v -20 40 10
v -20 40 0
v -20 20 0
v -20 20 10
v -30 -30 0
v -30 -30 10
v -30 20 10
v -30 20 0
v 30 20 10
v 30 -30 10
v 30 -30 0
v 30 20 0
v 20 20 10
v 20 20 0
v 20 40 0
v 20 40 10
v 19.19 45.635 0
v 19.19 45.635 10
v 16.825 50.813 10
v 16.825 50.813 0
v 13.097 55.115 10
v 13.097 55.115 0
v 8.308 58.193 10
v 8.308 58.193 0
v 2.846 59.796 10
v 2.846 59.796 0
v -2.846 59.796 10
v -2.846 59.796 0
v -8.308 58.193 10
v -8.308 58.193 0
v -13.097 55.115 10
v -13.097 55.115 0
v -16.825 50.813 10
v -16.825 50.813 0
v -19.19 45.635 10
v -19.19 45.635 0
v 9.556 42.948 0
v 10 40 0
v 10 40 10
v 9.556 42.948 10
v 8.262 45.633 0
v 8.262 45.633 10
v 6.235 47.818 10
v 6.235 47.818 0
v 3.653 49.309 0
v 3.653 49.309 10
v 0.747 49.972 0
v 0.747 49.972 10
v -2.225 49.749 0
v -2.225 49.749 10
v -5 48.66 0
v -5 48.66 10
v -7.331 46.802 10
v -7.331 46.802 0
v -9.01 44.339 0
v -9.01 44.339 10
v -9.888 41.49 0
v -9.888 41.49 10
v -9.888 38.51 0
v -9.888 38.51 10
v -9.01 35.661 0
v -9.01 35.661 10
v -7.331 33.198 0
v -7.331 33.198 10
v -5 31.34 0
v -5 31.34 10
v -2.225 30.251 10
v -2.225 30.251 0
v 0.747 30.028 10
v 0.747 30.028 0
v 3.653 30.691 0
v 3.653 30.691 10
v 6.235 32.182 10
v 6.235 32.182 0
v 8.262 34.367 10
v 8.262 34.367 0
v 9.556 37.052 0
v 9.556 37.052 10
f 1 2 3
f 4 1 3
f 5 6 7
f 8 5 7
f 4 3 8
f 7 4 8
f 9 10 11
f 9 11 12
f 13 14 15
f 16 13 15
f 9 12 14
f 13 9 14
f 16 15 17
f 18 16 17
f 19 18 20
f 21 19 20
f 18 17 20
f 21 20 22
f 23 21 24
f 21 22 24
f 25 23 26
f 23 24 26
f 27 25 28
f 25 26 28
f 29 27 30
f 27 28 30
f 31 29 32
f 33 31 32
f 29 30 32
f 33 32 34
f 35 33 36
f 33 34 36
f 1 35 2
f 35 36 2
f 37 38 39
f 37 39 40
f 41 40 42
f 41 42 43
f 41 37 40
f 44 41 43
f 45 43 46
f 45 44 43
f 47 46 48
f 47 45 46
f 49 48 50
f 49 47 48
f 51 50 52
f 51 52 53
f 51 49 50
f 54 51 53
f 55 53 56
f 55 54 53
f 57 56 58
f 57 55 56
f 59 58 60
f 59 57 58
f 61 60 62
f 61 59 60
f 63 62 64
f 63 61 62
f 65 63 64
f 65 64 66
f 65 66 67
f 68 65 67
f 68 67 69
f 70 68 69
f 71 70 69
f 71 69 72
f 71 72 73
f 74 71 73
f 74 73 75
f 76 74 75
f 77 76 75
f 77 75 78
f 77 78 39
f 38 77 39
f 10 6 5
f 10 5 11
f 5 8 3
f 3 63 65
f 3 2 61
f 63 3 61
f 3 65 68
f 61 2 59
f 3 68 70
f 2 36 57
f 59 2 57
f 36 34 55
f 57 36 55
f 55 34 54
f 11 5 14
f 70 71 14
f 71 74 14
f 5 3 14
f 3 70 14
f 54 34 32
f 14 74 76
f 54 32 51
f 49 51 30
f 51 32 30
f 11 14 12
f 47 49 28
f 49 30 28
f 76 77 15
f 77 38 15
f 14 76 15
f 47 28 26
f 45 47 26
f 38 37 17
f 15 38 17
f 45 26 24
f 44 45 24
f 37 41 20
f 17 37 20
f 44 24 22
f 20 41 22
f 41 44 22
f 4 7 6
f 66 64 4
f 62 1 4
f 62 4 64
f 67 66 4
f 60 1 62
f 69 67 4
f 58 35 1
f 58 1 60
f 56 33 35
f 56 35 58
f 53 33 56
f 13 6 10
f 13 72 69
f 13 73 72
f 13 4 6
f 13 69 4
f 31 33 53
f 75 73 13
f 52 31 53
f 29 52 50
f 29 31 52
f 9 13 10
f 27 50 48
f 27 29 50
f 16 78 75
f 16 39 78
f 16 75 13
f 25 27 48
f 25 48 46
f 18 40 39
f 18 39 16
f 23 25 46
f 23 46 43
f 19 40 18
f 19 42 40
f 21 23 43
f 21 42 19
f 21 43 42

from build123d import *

# Parameters (mm, degrees)
BOSS_EXTRUDE1_DEPTH = 10
SKETCH2_R           = 10
BOSS_EXTRUDE2_DEPTH = 20
SKETCH3_W           = 60
SKETCH3_H           = 30
BOSS_EXTRUDE3_DEPTH = 10
CUT_EXTRUDE1_START  = -30
SKETCH4_R           = 10
CUT_EXTRUDE1_DEPTH  = 30


with BuildPart() as part:
    # Sketch1 → Boss-Extrude1 (new body)
    with BuildSketch(Plane.XY):
        with BuildLine():
            Line((-30, 0), (30, 0))
            Line((30, 0), (30, 20))
            Line((30, 20), (20, 20))
            Line((20, 20), (20, 40))
            ThreePointArc((20, 40), (0, 60), (-20, 40))
            Line((-20, 40), (-20, 20))
            Line((-20, 20), (-30, 20))
            Line((-30, 20), (-30, 0))
        make_face()
    extrude(amount=BOSS_EXTRUDE1_DEPTH)

    # Sketch2 → Boss-Extrude2 (add)
    with BuildSketch(Plane.XY.offset(10)):
        with Locations((0, 40)):
            Circle(SKETCH2_R)
    extrude(amount=BOSS_EXTRUDE2_DEPTH)

    # Sketch3 → Boss-Extrude3 (add)
    with BuildSketch(Plane.XY.offset(10)):
        with Locations((0, -15)):
            Rectangle(SKETCH3_W, SKETCH3_H)
    extrude(amount=-BOSS_EXTRUDE3_DEPTH)

    # Sketch4 → Cut-Extrude1 (cut)
    with BuildSketch(Plane.XY.offset(30).offset(CUT_EXTRUDE1_START)):
        with Locations((0, 40)):
            Circle(SKETCH4_R)
    extrude(amount=CUT_EXTRUDE1_DEPTH, mode=Mode.SUBTRACT)


solid = part.part
